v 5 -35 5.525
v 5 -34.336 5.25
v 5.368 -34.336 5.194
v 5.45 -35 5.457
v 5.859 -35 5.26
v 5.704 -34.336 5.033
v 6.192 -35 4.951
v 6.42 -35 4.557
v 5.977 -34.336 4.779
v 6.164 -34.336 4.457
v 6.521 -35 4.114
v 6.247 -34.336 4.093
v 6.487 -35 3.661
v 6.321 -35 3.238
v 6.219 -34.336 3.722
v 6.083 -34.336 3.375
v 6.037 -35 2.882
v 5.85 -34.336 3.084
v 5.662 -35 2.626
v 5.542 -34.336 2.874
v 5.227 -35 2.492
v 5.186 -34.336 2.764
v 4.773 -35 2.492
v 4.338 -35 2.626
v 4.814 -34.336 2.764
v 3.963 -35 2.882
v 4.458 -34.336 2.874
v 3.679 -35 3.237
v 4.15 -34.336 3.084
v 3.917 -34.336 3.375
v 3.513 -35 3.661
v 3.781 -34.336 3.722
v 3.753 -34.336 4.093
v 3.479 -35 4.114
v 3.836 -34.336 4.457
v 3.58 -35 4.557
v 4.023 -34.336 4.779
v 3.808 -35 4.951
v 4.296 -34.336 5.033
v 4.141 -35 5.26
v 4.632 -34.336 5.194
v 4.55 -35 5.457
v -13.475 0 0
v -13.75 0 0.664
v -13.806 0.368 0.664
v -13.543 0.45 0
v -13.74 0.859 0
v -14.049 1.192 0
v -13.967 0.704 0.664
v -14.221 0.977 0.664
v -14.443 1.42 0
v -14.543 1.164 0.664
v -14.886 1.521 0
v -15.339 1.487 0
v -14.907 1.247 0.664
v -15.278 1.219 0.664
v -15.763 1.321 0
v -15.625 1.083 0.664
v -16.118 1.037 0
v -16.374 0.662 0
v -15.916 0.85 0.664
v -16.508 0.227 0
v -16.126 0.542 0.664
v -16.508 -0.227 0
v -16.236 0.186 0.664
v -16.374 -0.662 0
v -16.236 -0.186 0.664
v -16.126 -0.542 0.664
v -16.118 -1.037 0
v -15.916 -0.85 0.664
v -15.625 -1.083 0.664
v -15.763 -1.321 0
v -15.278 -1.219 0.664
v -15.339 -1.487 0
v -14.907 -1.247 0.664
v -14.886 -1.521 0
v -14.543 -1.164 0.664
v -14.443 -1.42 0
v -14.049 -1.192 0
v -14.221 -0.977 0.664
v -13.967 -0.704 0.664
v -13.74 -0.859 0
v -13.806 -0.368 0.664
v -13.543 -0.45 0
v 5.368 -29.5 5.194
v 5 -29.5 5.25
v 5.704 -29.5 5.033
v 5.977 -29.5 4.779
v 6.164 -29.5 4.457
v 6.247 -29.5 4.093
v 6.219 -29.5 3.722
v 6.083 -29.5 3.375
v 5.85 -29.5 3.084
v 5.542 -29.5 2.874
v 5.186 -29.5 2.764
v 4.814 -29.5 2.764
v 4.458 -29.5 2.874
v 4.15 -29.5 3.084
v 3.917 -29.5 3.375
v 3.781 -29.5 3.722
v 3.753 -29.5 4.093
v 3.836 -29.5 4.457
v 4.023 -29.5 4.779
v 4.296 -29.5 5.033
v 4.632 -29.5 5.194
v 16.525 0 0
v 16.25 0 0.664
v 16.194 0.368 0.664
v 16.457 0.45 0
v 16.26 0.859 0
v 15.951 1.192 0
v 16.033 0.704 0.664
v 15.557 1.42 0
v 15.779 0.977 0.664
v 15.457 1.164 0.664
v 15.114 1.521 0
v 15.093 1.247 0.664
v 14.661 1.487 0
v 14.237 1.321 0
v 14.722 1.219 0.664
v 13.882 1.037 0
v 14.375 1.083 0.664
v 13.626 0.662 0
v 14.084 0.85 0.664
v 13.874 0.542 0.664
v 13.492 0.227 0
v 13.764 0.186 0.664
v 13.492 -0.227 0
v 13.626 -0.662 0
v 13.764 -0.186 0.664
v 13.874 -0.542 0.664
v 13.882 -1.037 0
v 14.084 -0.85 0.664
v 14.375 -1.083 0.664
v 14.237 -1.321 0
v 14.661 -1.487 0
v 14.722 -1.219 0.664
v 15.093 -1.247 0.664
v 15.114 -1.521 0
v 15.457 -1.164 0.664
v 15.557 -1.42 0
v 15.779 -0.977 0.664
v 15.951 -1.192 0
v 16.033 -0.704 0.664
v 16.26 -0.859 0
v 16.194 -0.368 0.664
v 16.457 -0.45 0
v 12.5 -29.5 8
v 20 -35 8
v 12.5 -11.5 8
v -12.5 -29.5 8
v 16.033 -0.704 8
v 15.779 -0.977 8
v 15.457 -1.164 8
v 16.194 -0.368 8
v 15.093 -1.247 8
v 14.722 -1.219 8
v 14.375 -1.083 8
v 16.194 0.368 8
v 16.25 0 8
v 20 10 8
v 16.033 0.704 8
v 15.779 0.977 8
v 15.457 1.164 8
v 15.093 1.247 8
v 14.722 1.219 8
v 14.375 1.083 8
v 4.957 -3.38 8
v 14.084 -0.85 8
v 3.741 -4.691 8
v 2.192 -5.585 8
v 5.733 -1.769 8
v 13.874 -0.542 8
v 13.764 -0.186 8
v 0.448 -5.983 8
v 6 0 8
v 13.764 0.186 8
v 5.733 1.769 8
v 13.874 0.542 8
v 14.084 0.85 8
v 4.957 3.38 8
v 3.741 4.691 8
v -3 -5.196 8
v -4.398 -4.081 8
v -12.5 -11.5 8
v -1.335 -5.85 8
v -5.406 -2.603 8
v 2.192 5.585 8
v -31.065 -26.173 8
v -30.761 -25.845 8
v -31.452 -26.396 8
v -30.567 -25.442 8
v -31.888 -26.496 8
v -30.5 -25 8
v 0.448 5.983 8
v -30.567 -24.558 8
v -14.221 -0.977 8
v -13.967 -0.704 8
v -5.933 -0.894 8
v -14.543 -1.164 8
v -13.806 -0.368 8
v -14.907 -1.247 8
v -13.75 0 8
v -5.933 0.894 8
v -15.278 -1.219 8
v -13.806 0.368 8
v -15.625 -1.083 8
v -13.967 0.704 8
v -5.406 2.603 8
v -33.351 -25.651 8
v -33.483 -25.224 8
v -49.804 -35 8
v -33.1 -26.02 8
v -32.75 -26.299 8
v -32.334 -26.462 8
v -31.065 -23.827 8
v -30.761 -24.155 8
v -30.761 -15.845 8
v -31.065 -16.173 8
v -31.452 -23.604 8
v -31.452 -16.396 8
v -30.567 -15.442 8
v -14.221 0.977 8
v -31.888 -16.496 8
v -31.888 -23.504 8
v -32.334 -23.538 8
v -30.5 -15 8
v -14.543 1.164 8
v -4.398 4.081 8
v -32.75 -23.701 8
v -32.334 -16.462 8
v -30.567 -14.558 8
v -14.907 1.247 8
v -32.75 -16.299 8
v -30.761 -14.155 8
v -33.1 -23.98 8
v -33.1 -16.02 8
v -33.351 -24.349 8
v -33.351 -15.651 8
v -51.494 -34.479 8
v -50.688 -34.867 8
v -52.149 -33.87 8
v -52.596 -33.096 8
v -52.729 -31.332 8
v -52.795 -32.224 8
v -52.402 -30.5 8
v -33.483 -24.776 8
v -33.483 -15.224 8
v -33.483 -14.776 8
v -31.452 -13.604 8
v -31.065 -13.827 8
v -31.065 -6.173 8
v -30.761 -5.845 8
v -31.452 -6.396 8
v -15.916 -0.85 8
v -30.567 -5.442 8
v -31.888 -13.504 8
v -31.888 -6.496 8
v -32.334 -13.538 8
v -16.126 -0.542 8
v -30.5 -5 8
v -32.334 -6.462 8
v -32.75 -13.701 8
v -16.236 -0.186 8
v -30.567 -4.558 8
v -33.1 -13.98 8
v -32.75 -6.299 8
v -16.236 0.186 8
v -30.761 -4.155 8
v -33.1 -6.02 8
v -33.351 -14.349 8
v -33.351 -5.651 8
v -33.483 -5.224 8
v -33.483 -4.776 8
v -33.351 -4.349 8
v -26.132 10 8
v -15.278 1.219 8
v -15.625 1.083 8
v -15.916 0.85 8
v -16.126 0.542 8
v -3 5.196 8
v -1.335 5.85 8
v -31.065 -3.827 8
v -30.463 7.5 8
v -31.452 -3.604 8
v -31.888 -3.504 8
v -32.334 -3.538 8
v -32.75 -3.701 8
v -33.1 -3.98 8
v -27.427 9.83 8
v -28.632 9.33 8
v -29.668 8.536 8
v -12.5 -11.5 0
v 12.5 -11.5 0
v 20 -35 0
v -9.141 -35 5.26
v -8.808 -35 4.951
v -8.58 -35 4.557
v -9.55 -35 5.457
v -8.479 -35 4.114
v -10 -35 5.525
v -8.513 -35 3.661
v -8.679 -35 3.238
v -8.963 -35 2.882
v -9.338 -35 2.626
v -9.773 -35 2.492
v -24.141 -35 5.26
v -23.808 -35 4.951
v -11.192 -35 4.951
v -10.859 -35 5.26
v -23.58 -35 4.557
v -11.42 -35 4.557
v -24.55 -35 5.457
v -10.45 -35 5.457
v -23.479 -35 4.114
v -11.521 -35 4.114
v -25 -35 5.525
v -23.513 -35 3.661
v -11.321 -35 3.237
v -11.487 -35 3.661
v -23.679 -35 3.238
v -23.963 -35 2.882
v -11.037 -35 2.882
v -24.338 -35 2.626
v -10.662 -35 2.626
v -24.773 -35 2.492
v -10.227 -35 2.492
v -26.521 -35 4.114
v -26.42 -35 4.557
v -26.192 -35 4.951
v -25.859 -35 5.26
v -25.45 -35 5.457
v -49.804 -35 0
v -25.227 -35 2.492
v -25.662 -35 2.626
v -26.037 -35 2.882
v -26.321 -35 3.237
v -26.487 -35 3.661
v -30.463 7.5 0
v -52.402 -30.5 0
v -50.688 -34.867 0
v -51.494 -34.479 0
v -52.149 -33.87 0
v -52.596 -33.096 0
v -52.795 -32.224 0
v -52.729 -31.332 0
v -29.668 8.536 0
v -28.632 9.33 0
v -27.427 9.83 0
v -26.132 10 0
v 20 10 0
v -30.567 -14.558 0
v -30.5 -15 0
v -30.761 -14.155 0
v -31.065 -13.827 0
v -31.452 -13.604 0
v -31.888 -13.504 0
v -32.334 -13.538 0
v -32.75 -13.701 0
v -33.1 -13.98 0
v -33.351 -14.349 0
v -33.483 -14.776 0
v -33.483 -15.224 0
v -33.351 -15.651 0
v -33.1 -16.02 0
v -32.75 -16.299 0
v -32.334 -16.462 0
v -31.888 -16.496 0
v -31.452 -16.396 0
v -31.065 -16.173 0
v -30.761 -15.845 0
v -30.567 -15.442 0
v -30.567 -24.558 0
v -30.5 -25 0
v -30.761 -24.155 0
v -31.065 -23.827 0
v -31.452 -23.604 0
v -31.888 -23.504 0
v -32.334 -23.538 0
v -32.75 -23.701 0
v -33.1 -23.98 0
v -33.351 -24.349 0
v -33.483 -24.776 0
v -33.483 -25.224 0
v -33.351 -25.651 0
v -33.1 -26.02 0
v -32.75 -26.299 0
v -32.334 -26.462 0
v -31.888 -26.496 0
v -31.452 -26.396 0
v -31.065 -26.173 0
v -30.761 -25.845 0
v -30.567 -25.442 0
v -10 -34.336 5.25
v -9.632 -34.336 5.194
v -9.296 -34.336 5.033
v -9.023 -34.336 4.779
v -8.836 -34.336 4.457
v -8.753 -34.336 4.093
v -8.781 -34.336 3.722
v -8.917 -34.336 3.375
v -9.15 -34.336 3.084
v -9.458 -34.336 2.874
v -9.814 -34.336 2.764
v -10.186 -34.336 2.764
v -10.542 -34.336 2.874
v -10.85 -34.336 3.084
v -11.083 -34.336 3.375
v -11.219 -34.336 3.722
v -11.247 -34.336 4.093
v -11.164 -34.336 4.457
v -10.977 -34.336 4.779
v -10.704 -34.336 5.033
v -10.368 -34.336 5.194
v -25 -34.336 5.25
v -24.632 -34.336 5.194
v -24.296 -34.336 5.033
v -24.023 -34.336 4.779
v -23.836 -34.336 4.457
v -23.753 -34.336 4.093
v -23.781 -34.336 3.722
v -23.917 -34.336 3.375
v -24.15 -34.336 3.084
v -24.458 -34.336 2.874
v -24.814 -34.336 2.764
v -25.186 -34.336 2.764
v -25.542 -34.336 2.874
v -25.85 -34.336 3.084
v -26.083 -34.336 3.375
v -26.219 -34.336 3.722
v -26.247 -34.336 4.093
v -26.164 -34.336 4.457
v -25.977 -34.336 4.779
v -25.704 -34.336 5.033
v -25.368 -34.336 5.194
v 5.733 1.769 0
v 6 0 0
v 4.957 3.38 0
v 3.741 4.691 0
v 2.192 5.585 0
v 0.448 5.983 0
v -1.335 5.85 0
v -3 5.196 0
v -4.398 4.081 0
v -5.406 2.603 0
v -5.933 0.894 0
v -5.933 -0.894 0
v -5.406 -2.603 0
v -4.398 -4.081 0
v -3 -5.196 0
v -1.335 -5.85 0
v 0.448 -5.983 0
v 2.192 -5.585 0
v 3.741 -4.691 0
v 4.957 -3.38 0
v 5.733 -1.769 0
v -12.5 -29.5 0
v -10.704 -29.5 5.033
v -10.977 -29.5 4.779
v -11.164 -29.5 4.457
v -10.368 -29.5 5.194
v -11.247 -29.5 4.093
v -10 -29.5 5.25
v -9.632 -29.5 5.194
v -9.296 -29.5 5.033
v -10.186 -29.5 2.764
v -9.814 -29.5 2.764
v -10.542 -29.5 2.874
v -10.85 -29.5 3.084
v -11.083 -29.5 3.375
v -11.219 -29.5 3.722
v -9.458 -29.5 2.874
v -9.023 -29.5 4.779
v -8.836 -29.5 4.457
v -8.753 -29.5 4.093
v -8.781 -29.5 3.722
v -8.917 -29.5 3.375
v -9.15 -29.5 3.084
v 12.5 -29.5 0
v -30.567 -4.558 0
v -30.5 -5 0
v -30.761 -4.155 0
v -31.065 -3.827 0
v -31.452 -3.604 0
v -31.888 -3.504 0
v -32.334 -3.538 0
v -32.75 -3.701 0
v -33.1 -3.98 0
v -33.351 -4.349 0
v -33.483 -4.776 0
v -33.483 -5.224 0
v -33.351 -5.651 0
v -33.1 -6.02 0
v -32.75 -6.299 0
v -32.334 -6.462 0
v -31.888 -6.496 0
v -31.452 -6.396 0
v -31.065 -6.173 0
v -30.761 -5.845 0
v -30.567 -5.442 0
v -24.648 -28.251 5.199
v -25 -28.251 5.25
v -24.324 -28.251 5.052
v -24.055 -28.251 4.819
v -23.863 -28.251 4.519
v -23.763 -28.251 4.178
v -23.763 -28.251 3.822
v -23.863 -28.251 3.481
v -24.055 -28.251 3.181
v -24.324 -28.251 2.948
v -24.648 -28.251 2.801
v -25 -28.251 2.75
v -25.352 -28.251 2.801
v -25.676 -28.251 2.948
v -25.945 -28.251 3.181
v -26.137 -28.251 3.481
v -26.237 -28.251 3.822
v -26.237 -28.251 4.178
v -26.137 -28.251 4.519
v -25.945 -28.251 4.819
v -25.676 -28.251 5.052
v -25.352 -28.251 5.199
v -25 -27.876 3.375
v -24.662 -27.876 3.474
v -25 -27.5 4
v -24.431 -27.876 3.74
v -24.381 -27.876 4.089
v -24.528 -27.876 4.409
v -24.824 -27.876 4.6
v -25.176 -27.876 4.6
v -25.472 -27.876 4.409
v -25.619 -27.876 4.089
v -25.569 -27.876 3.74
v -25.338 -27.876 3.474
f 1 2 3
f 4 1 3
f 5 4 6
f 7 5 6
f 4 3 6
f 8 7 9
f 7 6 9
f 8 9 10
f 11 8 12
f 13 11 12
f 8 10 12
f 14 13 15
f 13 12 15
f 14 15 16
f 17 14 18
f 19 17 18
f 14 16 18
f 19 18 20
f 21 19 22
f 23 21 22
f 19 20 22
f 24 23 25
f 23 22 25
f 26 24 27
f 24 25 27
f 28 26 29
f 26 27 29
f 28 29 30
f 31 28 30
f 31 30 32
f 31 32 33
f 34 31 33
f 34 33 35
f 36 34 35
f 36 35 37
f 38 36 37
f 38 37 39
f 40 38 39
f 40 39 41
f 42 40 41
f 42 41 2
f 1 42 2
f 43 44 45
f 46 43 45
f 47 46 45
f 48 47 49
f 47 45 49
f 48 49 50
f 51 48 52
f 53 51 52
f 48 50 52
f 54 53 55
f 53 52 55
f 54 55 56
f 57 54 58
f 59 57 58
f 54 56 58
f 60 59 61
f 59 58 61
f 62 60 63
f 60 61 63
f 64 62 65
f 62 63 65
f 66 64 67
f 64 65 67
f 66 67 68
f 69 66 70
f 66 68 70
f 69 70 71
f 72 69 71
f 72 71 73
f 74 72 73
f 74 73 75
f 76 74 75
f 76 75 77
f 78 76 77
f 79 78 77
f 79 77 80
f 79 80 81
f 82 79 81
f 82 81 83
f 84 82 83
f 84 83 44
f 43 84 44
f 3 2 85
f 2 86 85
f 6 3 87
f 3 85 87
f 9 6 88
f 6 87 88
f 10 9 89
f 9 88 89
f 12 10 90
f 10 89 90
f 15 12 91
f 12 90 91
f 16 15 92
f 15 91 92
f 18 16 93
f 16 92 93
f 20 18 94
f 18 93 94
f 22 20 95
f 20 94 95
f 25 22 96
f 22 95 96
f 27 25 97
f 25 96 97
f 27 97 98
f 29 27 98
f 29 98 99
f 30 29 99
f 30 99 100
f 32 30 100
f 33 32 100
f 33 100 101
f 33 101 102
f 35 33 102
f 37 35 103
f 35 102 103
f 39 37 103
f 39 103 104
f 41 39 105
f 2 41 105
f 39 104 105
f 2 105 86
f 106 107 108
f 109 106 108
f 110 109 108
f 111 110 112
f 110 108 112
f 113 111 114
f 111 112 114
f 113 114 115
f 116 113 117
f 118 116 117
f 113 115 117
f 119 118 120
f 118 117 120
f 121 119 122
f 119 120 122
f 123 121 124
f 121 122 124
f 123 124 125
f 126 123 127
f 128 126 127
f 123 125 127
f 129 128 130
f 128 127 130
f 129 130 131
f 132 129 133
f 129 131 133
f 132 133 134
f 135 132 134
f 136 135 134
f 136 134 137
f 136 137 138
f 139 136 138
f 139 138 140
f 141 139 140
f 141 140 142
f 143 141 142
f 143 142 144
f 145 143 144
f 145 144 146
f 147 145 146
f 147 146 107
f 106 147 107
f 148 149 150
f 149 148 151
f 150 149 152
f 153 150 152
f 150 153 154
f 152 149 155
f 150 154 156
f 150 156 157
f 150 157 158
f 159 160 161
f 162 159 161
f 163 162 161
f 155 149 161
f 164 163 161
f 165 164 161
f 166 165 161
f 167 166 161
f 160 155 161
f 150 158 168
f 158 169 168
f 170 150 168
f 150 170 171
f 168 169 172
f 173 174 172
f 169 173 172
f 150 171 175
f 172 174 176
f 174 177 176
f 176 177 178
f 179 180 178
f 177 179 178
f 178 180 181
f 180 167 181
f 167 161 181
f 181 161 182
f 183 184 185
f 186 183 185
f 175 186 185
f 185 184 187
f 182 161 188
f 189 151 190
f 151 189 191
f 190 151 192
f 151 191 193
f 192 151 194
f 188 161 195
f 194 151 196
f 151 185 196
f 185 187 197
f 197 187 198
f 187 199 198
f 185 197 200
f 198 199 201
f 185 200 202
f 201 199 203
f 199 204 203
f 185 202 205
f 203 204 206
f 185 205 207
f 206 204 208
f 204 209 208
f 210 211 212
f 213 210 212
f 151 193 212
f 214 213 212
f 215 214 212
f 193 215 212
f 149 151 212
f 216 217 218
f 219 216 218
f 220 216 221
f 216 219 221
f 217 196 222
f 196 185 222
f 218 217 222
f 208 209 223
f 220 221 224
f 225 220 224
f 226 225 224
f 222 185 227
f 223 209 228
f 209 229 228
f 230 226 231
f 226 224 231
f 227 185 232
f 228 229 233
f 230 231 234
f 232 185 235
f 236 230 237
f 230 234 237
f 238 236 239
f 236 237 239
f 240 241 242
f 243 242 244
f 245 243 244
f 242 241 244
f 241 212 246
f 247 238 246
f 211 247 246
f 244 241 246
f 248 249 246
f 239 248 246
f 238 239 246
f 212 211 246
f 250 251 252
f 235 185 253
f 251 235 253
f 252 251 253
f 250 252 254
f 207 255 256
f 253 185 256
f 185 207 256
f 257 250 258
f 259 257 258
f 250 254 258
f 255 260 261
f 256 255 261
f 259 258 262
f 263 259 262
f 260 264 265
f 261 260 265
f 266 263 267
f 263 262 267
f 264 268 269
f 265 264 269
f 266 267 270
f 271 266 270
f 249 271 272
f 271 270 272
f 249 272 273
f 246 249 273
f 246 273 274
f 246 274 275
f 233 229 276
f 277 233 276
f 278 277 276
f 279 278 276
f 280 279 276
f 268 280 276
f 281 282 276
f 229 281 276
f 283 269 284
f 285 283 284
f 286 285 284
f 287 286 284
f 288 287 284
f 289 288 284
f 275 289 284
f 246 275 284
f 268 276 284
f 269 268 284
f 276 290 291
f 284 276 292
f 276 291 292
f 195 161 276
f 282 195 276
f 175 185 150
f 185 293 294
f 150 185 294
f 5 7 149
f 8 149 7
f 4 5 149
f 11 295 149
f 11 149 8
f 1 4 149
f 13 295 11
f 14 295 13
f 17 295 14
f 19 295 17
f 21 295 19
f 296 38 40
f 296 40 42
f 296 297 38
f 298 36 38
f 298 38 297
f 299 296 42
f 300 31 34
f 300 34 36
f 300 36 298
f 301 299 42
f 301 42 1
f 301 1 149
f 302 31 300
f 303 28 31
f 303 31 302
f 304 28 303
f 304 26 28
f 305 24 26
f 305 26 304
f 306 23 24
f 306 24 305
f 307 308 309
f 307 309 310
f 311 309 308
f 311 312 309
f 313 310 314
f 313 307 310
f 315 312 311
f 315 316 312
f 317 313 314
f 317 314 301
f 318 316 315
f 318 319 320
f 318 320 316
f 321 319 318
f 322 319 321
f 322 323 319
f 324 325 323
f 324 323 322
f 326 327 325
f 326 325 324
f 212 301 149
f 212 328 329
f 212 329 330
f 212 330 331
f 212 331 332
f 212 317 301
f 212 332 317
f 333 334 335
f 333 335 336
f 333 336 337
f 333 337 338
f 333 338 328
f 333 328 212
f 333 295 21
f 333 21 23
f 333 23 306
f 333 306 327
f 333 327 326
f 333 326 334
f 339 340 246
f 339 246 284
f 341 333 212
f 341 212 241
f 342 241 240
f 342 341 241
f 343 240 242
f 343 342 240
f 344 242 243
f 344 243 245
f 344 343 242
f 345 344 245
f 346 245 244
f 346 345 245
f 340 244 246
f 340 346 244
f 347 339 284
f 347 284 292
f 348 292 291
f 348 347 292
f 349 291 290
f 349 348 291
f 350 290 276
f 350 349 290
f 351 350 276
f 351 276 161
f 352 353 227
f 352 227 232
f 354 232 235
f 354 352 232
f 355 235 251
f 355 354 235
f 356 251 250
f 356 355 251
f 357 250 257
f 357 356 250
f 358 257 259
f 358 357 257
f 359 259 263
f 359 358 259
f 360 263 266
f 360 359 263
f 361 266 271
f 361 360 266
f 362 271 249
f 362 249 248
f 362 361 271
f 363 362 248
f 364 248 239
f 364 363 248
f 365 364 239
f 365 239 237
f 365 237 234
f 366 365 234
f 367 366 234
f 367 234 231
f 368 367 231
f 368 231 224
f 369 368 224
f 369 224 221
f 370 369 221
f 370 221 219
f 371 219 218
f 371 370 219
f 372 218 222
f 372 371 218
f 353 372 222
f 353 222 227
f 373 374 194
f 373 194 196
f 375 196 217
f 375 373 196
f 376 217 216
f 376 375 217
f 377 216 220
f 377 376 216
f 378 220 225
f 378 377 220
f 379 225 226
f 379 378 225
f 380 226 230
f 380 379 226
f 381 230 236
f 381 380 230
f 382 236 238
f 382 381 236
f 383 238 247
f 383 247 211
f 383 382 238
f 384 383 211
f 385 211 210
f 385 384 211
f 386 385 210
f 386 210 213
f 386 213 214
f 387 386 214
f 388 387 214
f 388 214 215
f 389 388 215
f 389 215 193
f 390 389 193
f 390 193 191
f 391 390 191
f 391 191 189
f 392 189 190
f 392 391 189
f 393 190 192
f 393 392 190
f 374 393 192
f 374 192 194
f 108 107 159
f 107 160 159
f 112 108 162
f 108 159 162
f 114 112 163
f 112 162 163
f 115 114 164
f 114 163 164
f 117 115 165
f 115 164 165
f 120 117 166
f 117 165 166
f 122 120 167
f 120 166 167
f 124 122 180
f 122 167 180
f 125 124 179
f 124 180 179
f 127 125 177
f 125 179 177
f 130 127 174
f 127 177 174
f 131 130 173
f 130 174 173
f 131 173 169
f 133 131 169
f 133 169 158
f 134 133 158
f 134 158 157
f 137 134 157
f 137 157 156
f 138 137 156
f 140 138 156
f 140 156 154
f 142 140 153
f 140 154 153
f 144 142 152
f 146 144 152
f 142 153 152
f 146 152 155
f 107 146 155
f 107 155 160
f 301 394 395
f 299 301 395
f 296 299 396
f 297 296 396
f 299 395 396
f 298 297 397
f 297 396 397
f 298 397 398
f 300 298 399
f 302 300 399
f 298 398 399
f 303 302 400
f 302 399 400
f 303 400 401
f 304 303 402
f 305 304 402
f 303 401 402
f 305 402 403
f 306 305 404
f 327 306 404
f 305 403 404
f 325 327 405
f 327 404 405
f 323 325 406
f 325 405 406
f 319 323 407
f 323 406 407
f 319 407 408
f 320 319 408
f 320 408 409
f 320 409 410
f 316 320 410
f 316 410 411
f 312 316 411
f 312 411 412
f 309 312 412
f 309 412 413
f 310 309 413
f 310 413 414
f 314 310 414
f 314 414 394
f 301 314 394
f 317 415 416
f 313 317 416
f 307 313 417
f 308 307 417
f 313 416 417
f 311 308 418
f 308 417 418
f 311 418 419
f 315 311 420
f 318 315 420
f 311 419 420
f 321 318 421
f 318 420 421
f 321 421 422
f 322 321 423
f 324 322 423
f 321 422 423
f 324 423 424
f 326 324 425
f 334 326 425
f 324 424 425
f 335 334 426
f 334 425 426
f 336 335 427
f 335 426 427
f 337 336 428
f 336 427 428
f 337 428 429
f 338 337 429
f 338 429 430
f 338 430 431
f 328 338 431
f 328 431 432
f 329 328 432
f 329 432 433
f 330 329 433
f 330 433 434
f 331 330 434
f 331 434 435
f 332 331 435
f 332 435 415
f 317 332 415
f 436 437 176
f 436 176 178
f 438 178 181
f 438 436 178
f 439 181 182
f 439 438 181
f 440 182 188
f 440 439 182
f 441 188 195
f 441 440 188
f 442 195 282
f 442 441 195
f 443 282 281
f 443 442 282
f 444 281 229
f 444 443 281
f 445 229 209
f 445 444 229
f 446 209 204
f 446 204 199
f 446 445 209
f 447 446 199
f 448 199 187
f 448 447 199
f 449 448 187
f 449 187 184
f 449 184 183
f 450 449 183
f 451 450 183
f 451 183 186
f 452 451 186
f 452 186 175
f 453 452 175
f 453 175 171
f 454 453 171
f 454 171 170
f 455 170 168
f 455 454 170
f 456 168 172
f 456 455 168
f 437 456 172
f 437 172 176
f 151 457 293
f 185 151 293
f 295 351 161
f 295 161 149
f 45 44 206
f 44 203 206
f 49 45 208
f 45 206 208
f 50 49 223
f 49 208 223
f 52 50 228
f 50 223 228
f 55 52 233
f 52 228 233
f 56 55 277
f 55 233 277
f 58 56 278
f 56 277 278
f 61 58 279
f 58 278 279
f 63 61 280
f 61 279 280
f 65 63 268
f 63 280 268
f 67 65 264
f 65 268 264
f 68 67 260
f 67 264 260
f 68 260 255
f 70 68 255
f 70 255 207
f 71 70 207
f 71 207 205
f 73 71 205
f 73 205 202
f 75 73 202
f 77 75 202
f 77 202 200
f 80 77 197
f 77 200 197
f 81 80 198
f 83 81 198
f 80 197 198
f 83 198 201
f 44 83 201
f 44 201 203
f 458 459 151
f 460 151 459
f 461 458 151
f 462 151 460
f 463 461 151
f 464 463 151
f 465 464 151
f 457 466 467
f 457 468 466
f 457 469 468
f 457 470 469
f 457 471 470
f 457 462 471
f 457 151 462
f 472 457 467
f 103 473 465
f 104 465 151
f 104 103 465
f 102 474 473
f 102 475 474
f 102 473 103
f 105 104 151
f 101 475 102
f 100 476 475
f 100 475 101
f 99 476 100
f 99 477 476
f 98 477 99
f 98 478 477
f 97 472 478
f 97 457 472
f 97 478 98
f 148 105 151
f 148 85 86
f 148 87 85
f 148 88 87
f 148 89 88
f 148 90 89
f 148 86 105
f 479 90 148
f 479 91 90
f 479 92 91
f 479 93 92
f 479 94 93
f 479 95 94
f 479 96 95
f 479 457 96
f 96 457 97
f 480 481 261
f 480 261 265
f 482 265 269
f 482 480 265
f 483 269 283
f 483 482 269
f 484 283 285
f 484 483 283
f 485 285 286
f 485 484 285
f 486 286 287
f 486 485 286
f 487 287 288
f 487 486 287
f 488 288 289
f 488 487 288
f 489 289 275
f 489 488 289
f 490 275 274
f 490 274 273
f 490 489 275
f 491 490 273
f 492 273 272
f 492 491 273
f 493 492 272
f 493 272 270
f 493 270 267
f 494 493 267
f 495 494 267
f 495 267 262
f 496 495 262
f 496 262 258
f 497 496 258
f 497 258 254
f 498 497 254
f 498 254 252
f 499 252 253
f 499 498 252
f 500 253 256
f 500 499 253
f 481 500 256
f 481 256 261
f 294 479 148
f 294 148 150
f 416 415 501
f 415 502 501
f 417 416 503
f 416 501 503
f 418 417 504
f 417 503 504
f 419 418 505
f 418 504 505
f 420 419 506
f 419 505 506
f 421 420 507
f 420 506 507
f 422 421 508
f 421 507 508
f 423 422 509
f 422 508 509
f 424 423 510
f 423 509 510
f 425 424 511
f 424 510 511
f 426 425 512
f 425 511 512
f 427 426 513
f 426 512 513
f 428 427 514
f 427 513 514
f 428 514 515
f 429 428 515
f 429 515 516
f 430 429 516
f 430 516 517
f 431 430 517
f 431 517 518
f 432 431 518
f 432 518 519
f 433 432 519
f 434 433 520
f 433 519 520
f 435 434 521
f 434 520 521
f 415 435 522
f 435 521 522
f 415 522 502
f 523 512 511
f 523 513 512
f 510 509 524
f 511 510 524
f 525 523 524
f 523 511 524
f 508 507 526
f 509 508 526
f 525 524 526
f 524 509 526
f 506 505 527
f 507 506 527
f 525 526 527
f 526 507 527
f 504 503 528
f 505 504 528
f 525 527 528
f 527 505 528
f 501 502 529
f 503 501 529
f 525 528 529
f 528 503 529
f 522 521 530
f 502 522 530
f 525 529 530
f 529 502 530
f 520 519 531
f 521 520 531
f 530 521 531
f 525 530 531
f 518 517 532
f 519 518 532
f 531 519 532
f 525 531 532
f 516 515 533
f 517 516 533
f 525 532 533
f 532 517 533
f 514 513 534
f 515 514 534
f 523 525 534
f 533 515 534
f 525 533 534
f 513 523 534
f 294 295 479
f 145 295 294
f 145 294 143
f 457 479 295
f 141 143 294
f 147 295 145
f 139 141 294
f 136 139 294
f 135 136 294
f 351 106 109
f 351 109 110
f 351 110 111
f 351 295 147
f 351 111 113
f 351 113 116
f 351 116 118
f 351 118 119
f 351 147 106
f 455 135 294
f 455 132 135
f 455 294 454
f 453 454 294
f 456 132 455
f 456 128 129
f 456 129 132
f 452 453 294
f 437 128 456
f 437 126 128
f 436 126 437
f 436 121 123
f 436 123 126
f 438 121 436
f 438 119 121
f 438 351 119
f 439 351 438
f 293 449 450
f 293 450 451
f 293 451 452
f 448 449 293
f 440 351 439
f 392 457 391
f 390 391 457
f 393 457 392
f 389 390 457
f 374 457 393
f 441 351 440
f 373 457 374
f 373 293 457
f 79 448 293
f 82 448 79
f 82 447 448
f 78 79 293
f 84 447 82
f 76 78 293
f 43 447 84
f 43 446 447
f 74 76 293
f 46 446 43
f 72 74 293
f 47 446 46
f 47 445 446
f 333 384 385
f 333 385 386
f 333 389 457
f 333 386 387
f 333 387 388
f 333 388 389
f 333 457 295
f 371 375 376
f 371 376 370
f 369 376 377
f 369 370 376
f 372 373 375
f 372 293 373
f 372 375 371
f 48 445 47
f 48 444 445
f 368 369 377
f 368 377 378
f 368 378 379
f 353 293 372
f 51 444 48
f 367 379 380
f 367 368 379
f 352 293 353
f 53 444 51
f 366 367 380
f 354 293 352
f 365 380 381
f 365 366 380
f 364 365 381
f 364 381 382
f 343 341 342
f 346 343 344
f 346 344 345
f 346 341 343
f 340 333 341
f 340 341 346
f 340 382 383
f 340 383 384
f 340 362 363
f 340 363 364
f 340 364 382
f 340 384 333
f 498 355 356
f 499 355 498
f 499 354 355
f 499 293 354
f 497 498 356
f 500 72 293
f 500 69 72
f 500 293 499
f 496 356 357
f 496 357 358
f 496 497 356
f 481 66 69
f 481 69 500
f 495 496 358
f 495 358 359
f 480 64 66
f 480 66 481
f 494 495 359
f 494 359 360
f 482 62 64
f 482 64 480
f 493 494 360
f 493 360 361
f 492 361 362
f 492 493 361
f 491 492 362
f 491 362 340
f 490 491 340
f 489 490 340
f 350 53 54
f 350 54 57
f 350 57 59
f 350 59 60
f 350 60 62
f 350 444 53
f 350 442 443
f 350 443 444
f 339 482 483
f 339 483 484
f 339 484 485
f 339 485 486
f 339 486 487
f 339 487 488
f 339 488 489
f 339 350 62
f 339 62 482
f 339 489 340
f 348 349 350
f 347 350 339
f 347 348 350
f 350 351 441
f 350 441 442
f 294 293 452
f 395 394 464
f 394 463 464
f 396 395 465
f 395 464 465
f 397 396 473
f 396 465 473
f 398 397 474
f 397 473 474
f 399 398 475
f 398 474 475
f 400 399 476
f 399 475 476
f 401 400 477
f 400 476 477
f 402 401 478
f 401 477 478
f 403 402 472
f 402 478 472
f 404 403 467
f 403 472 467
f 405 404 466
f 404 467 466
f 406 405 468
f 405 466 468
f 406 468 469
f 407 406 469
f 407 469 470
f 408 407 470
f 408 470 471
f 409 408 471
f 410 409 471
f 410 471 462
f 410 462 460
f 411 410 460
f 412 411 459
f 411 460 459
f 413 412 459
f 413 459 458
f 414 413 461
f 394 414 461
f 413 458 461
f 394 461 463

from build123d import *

# Parameters (mm, degrees)
SKETCH_1_R                   = 6
SKETCH_1_R_2                 = 1.5
SKETCH_1_W                   = 25
SKETCH_1_H                   = 18
EXTRUDE_1_DEPTH              = 8
HOLE_WIZARD_M3_1_D           = 2.5
HOLE_WIZARD_M3_1_DEPTH       = 6.748924226
HOLE_WIZARD_M3_1_CSINK_D     = 3.05
HOLE_WIZARD_M3_1_CSINK_ANGLE = 45
HOLE_WIZARD_M3_1_TIP         = 0.751075774
HOLE_WIZARD_M3_2_D           = 2.5
HOLE_WIZARD_M3_2_CSINK_D     = 3.05
HOLE_WIZARD_M3_2_CSINK_ANGLE = 45


with BuildPart() as part:
    # 草圖1 → 填料-伸長1 (new body)
    with BuildSketch(Plane.XY):
        with BuildLine():
            Line((-52.401923789, -30.5), (-30.462613559, 7.5))
            ThreePointArc((-30.462613559, 7.5), (-28.632486541, 9.330127019), (-26.132486541, 10))
            Line((-26.132486541, 10), (0, 10))
            Line((0, 10), (20, 10))
            Line((20, 10), (20, -35))
            Line((20, -35), (0, -35))
            Line((0, -35), (-49.803847577, -35))
            ThreePointArc((-49.803847577, -35), (-52.401923789, -33.5), (-52.401923789, -30.5))
        make_face()
        Circle(SKETCH_1_R, mode=Mode.SUBTRACT)
        with Locations((-32, -5)):
            Circle(SKETCH_1_R_2, mode=Mode.SUBTRACT)
        with Locations((-32, -15)):
            Circle(SKETCH_1_R_2, mode=Mode.SUBTRACT)
        with Locations((-32, -25)):
            Circle(SKETCH_1_R_2, mode=Mode.SUBTRACT)
        with Locations((0, -20.5)):
            Rectangle(SKETCH_1_W, SKETCH_1_H, mode=Mode.SUBTRACT)
    extrude(amount=EXTRUDE_1_DEPTH)

    # M3 螺紋孔1
    with Locations(Plane(origin=(-10, -35, 4), x_dir=(0, 0, -1), z_dir=(0, -1, 0))):
        with Locations((0, 0), (0, 15), (0, -15)):
            CounterSinkHole(HOLE_WIZARD_M3_1_D / 2, HOLE_WIZARD_M3_1_CSINK_D / 2, depth=HOLE_WIZARD_M3_1_DEPTH, counter_sink_angle=HOLE_WIZARD_M3_1_CSINK_ANGLE)
            with Locations((0, 0, -(HOLE_WIZARD_M3_1_DEPTH + HOLE_WIZARD_M3_1_TIP / 2))):  # 118° drill point
                Cone(0, HOLE_WIZARD_M3_1_D / 2, HOLE_WIZARD_M3_1_TIP, mode=Mode.SUBTRACT)

    # M3 螺紋孔2 (through all)
    with Locations(Plane(origin=(15, 0, 0), x_dir=(-1, 0, 0), z_dir=(0, 0, -1))):
        with Locations((0, 0), (30, 0)):
            CounterSinkHole(HOLE_WIZARD_M3_2_D / 2, HOLE_WIZARD_M3_2_CSINK_D / 2, counter_sink_angle=HOLE_WIZARD_M3_2_CSINK_ANGLE)


solid = part.part
